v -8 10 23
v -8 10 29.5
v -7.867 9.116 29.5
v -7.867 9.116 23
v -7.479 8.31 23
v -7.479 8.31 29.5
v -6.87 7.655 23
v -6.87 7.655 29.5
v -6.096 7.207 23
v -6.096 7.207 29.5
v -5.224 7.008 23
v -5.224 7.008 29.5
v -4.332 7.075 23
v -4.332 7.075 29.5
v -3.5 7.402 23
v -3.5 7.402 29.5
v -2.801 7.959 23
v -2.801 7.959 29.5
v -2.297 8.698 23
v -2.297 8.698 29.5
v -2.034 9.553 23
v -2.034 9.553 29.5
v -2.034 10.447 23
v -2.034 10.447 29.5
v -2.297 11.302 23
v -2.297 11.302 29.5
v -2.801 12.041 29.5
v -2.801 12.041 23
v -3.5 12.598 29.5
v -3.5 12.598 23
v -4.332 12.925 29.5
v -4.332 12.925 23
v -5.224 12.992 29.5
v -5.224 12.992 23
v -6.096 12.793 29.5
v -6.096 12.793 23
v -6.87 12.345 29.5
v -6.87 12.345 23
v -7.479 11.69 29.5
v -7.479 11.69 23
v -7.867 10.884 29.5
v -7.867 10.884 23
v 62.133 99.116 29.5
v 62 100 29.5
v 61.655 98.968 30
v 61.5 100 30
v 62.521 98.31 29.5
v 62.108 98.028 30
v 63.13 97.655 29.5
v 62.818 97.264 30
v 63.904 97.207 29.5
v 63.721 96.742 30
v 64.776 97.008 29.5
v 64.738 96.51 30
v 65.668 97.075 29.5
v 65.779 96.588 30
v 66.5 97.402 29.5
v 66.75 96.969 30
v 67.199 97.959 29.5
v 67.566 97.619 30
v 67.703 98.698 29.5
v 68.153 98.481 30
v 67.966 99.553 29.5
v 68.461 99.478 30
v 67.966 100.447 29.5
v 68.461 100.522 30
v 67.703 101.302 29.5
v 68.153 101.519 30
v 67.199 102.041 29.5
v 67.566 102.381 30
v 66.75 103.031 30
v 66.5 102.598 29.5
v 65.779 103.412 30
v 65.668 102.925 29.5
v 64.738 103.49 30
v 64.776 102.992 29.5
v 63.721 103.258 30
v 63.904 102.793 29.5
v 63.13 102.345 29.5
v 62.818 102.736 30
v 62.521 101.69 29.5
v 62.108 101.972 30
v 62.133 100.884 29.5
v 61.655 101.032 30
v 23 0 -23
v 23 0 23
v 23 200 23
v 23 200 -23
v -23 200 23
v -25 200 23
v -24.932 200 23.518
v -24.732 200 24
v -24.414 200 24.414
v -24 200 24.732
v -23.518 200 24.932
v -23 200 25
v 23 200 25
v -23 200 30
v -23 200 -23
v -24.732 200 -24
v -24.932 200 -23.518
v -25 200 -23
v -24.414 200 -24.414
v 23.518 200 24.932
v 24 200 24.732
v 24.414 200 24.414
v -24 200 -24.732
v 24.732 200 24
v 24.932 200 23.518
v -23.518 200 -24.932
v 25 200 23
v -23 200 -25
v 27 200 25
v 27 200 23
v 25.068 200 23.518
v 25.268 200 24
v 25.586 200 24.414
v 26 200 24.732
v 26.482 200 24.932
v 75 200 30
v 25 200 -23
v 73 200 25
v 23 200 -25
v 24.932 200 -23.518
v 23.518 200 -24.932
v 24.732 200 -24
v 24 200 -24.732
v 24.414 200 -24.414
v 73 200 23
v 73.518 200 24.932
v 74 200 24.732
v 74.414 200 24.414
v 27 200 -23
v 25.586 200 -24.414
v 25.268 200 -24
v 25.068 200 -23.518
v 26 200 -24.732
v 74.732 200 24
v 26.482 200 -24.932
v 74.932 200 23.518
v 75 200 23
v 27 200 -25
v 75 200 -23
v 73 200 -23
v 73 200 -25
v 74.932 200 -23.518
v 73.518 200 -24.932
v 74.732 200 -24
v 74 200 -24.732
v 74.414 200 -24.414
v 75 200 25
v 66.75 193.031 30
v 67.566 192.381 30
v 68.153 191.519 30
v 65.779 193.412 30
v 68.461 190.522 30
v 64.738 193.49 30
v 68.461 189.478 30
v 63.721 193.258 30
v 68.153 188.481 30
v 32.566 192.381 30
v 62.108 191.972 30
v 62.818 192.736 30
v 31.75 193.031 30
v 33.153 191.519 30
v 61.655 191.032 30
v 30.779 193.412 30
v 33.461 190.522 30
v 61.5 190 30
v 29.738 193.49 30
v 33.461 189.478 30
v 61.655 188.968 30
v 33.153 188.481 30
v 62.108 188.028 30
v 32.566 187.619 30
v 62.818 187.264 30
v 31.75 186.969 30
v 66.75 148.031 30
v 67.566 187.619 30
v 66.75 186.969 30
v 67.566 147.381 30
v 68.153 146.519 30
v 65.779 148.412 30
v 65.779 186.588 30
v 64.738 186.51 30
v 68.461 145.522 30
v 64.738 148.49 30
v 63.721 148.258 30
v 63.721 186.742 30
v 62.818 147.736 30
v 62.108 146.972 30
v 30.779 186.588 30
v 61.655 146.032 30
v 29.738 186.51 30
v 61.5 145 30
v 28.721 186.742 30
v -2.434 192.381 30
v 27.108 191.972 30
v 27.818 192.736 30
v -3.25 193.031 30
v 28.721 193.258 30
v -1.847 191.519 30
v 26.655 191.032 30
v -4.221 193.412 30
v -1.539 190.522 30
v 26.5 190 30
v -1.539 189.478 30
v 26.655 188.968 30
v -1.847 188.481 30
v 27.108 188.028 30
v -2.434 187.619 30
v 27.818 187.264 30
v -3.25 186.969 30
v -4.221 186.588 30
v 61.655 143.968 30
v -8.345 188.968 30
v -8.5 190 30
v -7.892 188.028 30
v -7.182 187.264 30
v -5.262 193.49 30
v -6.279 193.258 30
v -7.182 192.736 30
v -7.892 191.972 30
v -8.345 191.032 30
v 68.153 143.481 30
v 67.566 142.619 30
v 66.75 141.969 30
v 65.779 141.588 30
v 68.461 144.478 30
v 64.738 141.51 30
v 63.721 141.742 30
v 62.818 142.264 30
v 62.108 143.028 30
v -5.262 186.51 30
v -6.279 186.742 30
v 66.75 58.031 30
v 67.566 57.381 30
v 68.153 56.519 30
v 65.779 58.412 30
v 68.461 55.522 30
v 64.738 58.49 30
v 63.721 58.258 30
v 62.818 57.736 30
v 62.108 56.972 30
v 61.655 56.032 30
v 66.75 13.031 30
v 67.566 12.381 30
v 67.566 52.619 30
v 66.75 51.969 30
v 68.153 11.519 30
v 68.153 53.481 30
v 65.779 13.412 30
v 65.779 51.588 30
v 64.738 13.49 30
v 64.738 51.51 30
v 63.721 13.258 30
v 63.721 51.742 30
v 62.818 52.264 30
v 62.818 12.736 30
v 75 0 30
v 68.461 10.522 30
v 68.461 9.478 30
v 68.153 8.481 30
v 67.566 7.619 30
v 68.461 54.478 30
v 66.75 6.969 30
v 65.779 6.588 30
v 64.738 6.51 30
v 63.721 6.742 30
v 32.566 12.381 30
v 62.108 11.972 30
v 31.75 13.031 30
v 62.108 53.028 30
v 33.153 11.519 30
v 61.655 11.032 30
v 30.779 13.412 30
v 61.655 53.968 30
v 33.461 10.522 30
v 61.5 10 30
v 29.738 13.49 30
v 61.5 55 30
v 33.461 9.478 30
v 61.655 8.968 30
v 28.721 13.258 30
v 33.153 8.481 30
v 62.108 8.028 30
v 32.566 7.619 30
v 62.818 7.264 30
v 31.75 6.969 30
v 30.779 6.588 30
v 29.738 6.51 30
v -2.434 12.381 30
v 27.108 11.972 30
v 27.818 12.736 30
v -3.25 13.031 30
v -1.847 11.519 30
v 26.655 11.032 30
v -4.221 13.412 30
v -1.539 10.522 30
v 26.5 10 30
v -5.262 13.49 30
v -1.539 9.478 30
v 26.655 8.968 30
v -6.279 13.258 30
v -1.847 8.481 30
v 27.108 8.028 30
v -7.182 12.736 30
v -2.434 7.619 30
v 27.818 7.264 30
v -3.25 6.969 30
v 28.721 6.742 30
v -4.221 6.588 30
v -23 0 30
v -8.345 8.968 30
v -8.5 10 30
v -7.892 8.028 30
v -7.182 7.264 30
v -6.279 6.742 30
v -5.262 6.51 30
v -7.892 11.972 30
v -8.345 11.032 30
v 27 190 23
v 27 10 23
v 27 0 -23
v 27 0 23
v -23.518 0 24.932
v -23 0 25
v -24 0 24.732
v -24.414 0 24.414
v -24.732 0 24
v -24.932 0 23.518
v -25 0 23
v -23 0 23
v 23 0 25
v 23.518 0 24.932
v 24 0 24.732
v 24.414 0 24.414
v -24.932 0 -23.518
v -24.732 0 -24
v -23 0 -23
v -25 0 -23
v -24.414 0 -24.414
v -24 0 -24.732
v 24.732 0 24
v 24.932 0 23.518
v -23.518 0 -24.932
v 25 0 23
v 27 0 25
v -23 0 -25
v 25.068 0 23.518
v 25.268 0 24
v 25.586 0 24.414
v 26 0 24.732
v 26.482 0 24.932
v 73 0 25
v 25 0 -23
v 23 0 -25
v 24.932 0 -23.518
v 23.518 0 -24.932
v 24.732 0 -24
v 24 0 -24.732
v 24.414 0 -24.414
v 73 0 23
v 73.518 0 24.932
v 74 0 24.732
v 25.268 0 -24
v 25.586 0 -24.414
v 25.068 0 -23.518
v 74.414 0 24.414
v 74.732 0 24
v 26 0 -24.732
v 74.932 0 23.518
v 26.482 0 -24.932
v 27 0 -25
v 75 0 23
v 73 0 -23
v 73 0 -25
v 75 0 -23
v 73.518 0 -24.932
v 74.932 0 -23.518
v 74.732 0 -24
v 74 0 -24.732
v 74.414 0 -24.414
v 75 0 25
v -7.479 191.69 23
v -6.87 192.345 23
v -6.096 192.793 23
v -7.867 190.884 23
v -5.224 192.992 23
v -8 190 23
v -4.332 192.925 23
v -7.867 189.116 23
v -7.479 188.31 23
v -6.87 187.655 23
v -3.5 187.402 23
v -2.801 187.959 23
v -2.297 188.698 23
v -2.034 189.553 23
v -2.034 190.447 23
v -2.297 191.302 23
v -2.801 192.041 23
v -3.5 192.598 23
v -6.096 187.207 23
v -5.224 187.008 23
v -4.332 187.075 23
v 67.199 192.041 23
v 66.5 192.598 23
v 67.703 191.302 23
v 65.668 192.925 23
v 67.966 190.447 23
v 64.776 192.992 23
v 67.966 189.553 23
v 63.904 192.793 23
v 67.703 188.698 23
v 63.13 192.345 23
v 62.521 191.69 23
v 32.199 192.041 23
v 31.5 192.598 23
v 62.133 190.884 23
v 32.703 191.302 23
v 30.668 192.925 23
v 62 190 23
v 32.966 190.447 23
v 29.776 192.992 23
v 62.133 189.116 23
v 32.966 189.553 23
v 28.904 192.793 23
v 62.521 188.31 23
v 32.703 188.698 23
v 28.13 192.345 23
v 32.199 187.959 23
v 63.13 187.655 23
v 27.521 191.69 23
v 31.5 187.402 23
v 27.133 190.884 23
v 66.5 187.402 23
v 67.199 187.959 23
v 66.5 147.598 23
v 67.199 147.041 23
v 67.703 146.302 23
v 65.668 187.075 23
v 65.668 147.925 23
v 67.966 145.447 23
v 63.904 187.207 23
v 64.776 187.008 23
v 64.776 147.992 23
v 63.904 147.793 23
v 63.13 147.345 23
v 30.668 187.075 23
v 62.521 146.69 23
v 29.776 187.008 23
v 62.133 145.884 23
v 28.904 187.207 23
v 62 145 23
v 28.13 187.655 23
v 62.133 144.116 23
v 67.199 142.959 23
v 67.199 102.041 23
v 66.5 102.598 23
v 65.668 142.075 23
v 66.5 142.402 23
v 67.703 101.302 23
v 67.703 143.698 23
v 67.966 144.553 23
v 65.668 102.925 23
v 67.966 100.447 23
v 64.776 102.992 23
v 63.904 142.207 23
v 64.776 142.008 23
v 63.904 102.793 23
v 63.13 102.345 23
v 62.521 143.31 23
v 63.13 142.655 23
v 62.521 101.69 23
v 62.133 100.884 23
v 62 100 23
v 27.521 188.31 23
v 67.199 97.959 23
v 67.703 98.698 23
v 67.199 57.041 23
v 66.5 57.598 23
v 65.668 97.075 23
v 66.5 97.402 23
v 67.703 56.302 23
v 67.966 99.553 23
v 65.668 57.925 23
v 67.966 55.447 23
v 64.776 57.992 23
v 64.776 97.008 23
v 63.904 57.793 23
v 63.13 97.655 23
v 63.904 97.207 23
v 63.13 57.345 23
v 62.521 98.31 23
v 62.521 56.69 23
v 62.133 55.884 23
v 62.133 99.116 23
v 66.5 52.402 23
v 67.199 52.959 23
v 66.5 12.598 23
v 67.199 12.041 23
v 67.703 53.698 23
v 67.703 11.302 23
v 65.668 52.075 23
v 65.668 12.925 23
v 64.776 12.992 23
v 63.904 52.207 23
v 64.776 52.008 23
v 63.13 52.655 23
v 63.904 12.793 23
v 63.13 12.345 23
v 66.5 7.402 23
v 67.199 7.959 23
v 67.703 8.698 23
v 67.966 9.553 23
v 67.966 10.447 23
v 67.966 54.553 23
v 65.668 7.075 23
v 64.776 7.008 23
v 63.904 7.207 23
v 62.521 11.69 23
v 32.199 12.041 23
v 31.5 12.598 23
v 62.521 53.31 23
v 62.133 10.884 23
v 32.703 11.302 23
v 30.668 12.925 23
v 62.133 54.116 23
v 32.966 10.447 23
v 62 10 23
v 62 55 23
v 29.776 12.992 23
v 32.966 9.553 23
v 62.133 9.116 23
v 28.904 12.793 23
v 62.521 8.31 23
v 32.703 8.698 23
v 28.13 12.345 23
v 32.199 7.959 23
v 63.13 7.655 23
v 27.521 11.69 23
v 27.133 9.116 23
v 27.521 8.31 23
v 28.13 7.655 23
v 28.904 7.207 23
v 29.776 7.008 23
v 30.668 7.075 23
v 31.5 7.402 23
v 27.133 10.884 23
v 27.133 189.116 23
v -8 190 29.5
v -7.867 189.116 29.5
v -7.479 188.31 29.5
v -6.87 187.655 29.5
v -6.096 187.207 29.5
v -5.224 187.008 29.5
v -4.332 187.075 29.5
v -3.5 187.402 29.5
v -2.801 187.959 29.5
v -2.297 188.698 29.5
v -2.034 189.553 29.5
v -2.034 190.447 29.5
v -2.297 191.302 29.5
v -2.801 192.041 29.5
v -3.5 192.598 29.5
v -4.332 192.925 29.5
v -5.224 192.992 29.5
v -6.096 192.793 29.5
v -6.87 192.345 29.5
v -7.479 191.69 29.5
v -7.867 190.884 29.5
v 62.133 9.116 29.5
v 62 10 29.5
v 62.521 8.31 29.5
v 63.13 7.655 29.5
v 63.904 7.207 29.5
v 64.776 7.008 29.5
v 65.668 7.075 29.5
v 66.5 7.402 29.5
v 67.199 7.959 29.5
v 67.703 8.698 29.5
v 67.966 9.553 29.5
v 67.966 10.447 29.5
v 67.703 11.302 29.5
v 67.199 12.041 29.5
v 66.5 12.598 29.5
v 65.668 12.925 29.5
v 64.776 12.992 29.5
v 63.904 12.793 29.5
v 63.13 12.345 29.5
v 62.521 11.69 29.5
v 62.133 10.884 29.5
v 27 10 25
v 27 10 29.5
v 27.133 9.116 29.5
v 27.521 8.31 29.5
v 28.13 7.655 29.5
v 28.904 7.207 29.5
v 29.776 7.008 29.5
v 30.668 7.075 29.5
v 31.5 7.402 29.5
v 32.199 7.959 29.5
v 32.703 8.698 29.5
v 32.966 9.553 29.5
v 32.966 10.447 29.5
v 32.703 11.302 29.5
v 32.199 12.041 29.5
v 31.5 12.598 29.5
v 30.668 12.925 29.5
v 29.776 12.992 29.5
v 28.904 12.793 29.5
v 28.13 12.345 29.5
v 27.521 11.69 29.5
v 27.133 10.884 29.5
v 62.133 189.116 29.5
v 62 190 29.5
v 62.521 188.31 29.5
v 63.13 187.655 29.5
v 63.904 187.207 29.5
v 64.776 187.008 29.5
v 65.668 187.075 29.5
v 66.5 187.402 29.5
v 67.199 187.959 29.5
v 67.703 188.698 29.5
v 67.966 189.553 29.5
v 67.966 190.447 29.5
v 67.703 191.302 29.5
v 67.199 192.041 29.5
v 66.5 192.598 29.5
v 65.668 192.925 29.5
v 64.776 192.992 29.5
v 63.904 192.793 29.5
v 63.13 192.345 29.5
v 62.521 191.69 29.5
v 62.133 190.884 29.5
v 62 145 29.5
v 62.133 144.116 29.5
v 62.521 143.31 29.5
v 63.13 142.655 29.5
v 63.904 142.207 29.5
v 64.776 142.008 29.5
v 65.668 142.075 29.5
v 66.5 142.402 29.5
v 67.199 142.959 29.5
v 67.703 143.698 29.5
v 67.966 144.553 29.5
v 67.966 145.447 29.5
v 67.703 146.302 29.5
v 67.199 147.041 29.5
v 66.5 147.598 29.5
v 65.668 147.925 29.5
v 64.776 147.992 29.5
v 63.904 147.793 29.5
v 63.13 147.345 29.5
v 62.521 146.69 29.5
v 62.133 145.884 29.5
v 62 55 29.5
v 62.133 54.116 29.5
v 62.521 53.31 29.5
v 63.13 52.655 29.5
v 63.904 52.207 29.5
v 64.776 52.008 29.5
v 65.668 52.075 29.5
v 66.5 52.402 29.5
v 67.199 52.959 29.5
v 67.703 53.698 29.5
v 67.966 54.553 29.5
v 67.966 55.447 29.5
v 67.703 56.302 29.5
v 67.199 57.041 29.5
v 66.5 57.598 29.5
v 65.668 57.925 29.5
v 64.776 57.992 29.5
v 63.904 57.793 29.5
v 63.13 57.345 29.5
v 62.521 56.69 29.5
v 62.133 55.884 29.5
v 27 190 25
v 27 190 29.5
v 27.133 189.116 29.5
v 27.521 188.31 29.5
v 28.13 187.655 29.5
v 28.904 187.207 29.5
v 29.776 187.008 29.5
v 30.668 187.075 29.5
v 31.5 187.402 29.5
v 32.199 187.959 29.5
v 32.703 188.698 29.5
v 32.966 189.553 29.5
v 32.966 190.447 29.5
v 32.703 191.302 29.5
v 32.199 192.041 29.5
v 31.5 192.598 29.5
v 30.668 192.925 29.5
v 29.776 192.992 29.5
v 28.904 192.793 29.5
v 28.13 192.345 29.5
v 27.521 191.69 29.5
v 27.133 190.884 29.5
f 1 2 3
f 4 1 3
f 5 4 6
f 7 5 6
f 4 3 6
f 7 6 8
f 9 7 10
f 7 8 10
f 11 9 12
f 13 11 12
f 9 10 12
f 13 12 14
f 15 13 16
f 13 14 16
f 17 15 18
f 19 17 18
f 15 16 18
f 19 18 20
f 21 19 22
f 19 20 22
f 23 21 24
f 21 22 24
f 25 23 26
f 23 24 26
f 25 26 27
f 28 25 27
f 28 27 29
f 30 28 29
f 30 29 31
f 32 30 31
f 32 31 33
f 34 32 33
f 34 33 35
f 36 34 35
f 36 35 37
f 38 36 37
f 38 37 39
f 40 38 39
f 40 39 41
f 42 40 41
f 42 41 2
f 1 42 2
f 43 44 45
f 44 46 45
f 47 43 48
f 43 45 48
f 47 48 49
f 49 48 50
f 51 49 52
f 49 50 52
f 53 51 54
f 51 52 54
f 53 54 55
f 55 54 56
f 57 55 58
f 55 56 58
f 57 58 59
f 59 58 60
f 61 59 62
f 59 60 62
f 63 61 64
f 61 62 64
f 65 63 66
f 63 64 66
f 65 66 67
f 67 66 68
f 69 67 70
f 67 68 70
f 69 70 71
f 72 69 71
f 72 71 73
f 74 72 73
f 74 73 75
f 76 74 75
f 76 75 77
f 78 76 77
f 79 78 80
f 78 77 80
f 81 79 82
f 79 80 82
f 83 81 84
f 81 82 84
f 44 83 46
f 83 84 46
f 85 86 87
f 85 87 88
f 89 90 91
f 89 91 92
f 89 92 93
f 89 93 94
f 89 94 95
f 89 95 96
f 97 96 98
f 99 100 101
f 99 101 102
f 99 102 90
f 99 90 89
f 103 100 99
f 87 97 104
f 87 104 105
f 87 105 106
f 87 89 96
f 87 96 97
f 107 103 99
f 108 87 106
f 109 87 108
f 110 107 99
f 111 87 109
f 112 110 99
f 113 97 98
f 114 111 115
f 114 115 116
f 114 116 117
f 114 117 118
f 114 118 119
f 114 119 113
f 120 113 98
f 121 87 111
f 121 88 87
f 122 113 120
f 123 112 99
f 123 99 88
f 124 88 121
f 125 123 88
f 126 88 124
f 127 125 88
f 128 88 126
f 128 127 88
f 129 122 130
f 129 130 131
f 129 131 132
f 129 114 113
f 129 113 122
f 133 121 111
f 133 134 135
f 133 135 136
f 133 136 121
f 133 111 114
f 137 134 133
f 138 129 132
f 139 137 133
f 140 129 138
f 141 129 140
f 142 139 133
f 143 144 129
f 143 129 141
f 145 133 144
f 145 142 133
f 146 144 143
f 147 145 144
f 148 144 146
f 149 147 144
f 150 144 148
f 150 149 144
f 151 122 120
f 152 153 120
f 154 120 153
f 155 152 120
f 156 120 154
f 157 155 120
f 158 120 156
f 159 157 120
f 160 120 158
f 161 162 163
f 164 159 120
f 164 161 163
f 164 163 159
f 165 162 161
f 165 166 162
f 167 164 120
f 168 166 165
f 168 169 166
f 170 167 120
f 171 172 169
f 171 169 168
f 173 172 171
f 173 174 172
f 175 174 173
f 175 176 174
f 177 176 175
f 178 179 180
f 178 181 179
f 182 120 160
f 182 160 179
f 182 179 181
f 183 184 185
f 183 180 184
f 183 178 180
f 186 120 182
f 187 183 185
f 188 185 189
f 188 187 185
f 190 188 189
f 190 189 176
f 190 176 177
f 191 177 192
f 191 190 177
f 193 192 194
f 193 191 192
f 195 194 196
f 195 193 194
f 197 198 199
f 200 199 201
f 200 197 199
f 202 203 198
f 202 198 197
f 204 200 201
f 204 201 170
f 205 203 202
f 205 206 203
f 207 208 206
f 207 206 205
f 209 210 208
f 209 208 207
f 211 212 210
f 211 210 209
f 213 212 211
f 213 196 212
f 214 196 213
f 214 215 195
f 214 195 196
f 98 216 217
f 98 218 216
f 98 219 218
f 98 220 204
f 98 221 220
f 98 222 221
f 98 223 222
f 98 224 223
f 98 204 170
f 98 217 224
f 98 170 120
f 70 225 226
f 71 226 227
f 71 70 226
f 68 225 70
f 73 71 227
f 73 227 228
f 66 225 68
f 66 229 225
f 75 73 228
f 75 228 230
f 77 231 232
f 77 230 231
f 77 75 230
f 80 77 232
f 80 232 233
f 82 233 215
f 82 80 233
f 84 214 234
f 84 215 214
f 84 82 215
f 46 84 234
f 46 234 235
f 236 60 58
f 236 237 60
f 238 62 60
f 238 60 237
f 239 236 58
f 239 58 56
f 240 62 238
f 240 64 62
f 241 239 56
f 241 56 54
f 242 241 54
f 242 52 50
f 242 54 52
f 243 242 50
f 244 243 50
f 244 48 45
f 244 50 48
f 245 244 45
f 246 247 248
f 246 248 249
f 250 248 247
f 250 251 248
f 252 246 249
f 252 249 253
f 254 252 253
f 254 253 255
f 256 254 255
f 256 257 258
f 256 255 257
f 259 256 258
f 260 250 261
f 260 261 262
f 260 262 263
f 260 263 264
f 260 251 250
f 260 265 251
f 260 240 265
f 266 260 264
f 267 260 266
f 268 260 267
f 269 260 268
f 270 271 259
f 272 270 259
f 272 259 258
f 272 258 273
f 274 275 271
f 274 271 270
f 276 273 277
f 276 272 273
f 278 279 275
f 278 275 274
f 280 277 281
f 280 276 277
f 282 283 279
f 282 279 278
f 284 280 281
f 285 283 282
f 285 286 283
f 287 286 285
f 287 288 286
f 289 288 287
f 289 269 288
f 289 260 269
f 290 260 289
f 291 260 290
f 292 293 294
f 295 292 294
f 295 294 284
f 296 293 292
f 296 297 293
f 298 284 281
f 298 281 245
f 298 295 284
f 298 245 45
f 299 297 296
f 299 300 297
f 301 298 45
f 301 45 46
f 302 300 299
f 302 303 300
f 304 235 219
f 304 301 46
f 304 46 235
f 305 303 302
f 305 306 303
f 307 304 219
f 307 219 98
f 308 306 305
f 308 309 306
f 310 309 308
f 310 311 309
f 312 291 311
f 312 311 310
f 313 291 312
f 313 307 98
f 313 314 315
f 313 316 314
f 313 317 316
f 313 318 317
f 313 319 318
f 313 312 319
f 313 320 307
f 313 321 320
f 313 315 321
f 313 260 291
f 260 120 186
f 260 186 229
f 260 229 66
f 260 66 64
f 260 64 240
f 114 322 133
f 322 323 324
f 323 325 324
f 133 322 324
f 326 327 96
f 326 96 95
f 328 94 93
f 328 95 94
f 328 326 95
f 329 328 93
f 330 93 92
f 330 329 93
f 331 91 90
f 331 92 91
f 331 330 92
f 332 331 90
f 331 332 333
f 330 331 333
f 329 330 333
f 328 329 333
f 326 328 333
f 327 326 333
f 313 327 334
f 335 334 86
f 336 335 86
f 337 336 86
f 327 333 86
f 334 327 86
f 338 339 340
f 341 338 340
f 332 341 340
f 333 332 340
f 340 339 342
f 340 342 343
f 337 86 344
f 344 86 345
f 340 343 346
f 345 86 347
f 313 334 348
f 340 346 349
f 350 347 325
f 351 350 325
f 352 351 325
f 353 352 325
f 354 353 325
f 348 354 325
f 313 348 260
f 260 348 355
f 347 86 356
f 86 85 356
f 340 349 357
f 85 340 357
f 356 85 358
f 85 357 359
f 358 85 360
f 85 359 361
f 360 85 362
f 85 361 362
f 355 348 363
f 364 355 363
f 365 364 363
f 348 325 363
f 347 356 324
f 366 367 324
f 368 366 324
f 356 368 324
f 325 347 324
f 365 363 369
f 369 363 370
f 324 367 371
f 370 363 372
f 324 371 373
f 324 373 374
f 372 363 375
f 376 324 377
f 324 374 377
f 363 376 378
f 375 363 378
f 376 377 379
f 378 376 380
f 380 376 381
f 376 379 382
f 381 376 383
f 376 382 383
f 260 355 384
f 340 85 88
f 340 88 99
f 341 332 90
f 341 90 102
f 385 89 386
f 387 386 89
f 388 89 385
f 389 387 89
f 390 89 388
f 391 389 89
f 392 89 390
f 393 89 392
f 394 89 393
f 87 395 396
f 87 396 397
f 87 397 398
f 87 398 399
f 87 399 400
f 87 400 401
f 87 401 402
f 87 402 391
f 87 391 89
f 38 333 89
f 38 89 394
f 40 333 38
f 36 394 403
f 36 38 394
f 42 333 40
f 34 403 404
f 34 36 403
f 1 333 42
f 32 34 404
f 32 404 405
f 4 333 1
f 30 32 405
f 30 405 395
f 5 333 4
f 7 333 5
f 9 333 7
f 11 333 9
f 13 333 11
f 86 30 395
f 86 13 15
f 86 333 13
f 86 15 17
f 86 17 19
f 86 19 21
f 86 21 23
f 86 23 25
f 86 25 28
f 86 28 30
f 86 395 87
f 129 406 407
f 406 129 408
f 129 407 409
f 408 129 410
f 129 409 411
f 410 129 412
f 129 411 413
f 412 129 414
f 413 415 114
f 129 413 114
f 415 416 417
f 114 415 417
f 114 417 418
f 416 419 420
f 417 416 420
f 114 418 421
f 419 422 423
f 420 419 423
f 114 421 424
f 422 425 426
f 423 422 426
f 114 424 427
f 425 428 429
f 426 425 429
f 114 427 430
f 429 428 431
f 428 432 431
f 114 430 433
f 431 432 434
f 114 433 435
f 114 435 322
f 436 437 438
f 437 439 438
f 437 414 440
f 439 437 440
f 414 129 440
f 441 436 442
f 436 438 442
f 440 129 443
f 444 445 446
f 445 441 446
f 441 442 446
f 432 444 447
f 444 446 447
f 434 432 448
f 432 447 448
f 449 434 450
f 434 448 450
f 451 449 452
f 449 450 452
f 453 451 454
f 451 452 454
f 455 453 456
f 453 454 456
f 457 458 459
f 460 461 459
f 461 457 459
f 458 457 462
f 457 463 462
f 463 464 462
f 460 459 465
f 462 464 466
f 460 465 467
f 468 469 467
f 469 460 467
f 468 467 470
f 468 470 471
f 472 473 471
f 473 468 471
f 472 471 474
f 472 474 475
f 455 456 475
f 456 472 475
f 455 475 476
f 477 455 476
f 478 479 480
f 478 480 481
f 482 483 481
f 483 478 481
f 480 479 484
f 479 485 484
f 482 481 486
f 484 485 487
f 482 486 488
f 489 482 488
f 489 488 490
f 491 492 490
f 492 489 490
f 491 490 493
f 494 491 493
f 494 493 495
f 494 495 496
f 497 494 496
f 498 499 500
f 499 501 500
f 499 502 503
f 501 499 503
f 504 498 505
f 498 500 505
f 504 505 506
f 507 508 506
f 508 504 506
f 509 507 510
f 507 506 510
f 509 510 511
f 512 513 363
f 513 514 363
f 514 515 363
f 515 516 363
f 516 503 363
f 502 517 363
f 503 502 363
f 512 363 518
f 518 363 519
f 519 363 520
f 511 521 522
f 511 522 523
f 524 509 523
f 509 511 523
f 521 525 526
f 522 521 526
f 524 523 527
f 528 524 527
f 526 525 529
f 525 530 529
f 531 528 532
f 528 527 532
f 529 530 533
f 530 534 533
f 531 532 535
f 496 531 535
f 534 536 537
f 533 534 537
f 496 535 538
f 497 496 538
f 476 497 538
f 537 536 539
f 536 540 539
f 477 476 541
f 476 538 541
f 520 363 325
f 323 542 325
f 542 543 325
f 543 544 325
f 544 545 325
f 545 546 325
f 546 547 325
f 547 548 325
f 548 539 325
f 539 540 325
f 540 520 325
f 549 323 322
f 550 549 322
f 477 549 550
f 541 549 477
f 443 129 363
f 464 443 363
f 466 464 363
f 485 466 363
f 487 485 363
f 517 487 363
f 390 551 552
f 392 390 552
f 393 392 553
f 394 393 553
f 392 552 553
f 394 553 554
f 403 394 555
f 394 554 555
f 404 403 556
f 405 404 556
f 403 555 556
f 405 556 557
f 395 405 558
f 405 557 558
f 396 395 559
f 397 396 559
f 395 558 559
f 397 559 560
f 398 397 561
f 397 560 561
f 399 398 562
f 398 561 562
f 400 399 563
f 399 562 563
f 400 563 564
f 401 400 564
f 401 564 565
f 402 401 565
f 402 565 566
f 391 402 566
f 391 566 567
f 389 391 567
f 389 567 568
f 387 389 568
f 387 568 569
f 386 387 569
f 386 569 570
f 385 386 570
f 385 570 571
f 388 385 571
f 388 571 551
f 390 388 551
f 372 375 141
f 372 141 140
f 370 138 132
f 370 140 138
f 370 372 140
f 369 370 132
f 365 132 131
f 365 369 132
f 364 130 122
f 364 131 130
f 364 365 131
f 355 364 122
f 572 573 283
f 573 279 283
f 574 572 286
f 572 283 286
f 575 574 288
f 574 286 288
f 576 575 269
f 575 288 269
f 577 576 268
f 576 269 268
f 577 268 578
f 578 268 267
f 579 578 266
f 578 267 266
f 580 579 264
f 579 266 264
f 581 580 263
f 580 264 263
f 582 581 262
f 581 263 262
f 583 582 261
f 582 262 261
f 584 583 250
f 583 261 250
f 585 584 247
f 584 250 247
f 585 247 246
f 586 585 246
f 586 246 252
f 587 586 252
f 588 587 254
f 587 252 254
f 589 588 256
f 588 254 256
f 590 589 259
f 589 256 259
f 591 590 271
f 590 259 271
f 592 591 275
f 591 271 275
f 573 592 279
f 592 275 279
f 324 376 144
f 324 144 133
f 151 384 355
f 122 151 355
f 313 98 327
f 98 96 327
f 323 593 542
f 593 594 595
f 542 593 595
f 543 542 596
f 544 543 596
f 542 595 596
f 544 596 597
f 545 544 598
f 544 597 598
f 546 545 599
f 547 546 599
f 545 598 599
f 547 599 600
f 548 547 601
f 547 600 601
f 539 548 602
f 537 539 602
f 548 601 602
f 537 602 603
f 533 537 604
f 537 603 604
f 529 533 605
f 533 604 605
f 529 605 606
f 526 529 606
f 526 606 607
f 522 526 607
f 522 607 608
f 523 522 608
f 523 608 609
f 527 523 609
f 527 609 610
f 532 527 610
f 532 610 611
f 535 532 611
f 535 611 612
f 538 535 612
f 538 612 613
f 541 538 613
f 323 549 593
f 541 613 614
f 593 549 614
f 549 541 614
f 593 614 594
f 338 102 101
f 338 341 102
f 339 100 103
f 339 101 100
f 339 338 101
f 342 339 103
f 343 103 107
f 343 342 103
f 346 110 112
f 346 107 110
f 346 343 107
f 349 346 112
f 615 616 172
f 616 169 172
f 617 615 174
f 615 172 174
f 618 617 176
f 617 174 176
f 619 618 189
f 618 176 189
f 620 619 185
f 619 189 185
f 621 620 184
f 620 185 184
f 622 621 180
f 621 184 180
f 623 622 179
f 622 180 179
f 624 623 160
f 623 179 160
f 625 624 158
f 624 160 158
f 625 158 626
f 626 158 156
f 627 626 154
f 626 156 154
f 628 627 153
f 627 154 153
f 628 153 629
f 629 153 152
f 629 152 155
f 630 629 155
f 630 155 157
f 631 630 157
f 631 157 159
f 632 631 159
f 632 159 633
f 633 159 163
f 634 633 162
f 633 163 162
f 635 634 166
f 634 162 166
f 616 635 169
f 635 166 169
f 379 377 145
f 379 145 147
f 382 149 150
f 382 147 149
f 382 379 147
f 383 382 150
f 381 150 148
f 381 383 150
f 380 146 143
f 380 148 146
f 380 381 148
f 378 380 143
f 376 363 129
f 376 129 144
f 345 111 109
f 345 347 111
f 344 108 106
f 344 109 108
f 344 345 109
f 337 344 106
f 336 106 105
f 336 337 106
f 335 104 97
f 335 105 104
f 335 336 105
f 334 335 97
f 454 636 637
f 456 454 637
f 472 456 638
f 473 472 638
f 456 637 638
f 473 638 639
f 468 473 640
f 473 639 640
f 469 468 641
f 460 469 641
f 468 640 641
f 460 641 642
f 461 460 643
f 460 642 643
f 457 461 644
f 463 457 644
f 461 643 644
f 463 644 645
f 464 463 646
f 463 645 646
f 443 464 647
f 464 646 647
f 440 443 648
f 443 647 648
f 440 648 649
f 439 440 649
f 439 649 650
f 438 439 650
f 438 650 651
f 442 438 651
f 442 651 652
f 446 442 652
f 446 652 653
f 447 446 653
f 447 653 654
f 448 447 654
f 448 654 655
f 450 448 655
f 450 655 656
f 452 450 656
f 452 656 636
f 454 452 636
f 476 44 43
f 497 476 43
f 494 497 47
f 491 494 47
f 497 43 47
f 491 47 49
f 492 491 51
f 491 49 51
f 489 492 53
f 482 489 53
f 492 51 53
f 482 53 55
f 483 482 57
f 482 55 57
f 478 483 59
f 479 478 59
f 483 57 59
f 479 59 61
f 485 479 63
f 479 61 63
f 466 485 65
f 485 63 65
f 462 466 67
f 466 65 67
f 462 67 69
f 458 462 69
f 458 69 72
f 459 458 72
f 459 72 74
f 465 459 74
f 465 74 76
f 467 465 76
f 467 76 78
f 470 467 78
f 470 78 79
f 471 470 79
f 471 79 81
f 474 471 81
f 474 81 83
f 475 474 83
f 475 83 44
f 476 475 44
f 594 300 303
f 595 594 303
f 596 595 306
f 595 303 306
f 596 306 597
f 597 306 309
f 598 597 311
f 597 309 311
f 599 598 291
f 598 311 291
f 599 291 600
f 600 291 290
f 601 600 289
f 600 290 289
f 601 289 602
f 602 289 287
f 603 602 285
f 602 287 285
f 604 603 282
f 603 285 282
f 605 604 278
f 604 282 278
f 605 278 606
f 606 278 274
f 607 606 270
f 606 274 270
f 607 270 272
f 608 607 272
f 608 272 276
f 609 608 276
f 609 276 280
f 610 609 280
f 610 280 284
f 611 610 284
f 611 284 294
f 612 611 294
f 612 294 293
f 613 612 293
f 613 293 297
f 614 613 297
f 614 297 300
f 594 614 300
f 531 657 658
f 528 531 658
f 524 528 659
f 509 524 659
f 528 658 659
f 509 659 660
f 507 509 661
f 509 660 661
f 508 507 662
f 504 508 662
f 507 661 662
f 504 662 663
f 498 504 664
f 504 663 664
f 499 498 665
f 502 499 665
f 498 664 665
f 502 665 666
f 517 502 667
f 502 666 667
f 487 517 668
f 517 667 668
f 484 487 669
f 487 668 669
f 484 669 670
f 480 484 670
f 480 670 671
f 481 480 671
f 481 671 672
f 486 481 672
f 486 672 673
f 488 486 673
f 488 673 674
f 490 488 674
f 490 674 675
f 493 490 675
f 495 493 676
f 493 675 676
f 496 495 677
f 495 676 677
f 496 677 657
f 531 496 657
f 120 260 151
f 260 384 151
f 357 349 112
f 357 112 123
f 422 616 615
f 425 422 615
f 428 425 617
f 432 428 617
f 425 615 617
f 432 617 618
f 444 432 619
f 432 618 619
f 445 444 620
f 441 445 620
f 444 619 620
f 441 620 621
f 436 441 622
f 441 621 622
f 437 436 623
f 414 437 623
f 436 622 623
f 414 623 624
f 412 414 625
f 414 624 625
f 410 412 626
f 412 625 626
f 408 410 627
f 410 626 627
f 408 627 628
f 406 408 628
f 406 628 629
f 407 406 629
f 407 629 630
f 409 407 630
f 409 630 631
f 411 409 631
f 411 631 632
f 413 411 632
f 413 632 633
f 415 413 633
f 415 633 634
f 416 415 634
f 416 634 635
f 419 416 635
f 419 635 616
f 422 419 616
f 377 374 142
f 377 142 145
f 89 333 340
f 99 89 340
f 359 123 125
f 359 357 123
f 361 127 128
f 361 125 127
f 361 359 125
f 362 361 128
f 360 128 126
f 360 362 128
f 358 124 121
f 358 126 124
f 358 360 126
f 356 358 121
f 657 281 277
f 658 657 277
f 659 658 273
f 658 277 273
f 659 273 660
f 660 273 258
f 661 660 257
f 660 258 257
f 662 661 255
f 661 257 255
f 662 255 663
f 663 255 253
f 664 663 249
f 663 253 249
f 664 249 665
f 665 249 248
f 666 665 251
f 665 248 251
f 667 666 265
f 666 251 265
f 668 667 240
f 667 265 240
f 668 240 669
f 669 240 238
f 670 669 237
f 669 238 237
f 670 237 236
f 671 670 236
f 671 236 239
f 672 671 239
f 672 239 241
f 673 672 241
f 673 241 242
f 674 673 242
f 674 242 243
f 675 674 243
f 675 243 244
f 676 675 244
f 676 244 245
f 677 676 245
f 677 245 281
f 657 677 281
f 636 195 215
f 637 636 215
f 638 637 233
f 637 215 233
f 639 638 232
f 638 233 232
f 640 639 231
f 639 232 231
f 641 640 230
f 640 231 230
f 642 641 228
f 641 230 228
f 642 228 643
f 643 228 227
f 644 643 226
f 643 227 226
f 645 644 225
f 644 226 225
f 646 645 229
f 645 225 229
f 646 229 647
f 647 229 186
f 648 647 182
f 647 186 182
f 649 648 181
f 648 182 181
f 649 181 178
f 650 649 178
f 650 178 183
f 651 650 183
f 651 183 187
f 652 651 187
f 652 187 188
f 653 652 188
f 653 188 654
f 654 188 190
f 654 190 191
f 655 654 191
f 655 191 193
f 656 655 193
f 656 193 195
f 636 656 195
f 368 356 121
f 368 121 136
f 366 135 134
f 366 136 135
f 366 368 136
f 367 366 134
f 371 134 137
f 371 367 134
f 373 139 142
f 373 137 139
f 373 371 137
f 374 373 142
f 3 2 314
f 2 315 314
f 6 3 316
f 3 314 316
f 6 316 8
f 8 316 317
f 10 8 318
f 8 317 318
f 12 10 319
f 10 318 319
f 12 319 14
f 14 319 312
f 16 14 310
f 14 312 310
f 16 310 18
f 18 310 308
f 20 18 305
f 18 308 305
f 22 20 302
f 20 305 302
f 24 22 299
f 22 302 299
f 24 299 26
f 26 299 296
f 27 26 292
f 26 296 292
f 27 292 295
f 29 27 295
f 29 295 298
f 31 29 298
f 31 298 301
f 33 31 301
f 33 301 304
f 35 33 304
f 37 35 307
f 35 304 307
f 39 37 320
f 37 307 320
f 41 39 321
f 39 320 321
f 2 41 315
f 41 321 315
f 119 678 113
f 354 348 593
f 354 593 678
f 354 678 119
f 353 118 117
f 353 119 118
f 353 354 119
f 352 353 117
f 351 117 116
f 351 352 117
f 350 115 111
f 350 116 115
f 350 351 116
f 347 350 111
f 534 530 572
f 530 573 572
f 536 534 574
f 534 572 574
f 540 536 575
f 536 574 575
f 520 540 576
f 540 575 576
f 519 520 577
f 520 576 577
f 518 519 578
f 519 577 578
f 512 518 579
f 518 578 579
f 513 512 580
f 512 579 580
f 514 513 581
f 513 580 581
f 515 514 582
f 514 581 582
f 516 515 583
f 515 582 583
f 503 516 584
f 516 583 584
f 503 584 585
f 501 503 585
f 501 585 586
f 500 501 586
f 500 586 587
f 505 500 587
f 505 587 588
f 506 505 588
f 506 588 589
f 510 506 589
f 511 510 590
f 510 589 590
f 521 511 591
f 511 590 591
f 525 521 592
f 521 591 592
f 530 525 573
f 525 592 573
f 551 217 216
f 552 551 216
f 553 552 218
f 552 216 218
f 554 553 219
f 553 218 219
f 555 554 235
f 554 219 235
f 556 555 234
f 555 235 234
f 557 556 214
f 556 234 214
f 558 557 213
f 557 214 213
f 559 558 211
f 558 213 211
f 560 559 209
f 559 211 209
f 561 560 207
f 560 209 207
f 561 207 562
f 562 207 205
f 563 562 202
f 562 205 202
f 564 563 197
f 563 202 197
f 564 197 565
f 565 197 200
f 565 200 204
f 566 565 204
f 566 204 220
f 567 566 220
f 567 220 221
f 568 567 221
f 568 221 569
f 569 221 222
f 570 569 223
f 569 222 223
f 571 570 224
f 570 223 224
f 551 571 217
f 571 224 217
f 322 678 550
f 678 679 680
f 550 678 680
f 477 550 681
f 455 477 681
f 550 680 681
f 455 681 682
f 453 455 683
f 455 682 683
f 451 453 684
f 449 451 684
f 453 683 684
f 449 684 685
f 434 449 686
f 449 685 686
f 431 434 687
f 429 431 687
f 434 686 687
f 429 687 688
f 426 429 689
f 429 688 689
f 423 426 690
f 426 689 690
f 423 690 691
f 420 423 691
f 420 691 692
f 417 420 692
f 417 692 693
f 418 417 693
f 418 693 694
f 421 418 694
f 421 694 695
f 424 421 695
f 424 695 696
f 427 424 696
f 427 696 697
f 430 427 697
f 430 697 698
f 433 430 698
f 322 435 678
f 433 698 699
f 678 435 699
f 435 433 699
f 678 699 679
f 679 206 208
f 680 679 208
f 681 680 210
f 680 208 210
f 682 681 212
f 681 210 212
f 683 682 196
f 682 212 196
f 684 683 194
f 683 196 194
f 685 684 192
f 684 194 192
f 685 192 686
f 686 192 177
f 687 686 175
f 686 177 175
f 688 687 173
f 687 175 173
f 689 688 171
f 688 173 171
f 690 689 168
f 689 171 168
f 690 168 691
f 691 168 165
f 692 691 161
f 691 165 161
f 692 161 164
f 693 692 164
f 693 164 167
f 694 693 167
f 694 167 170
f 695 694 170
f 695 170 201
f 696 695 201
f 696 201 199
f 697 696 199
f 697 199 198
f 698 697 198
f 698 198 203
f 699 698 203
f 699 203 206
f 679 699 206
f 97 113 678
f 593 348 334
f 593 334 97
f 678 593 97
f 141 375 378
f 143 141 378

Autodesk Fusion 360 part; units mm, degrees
sketch "Sketch1" plane through (0, 0, 0) normal (0, 1, 0) x (1, 0, 0)
  line L0 (0, -25) -> (23, -25)
  line L1 (25, -23) -> (25, 23)
  line L2 (23, 25) -> (0, 25)
  line L3 (0, -25) -> (-23, -25)
  line L4 (-25, -23) -> (-25, 23)
  line L5 (-23, 25) -> (0, 25)
  line L6 (0, -23) -> (-23, -23)
  line L7 (-23, -23) -> (-23, 23)
  line L8 (-23, 23) -> (0, 23)
  line L9 (23, 23) -> (0, 23)
  line L10 (23, -23) -> (23, 23)
  line L11 (0, -23) -> (23, -23)
  arc A0 (23, -25) -> (25, -23) centre (23, -23) ccw
  arc A1 (-25, -23) -> (-23, -25) centre (-23, -23) ccw
  arc A2 (-23, 25) -> (-25, 23) centre (-23, 23) ccw
  arc A3 (25, 23) -> (23, 25) centre (23, 23) ccw
  line L12 (73, 23) -> (50, 23)
  line L13 (73, 25) -> (50, 25)
  line L14 (50, -23) -> (73, -23)
  line L15 (50, -23) -> (27, -23)
  line L16 (50, -25) -> (73, -25)
  arc A4 (25, -23) -> (27, -25) centre (27, -23) ccw
  line L17 (27, 25) -> (50, 25)
  arc A5 (75, 23) -> (73, 25) centre (73, 23) ccw
  line L18 (73, -23) -> (73, 23)
  line L19 (25, -23) -> (25, 23)
  line L20 (27, -23) -> (27, 23)
  arc A6 (73, -25) -> (75, -23) centre (73, -23) ccw
  arc A7 (27, 25) -> (25, 23) centre (27, 23) ccw
  line L21 (50, -25) -> (27, -25)
  line L22 (75, -23) -> (75, 23)
  line L23 (27, 23) -> (50, 23)
  point P0 (25, -25)
  point P1 (25, 25)
  point P2 (75, -25)
  point P3 (75, 25)
  point P4 (50, 0)
  dimension "d1" = 25
  dimension "d2" = 25
  dimension "d3" = 50
  dimension "d4" = 2
  dimension "d7" = 2
  dimension "d8" = 2
  dimension "d9" = 2
  dimension "d10" = 2
  dimension "d11" = 2
  dimension "d12" = 25
  dimension "d13" = 25
  dimension "d14" = 50
  dimension "d15" = 2
  dimension "d16" = 2
  dimension "d17" = 2
  dimension "d18" = 2
extrude "Extrude2" add sketch "Sketch1" along normal blind 200
sketch "Sketch2" plane through (0, 0, 25) normal (0, 0, 1) x (-1, 0, 0)
  line L0 (23, 0) -> (-23, 0)
  line L1 (-23, 0) -> (-23, -200)
  line L2 (-23, -200) -> (23, -200)
  line L3 (23, -200) -> (23, 0)
  line L4 (25, 0) -> (-75, 0)
  line L5 (-75, 0) -> (-75, -200)
  line L6 (-75, -200) -> (25, -200)
  line L7 (25, -200) -> (25, 0)
  dimension "d21" = 100
  dimension "d22" = 200
extrude "Extrude3" add sketch "Sketch2" along normal blind 5 contours L0 L1 L2 L3 L4 L6 | L1 L4 L5 L6
sketch "Sketch3" plane through (0, 0, 30) normal (0, 0, 1) x (-1, 0, 0)
  line L0 (-75, -200) -> (23, -200)
  line L1 (23, -200) -> (23, 0)
  line L2 (23, 0) -> (-75, 0)
  line L3 (-75, 0) -> (-75, -200)
  line L4 (-75, 0) -> (-65, 0)
  line L5 (-65, 0) -> (-65, -10)
  line L6 (-65, -10) -> (-75, -10)
  line L7 (-75, -10) -> (-75, 0)
  circle A0 centre (-65, -10) radius 3
  circle A1 centre (-30, -10) radius 3
  circle A2 centre (5, -10) radius 3
  circle A3 centre (-65, -55) radius 3
  circle A4 centre (-65, -100) radius 3
  circle A5 centre (-65, -145) radius 3
  circle A6 centre (-65, -190) radius 3
  circle A7 centre (-30, -190) radius 3
  circle A8 centre (5, -190) radius 3
  dimension "d25" = 10
  dimension "d26" = 10
  dimension "d27" = 6
  dimension "d30" = 70
  dimension "d31" = -180
extrude "Extrude4" cut sketch "Sketch3" against normal blind 7 contours L5 L6 A0 | L5 L6 A0 | A1 | A2 | A3 | A4 | A5 | A6 | A7 | A8
chamfer "Chamfer1" distance 0.5 angle 45 1 edges at (-2.203, 188.9152, 30)
chamfer "Chamfer2" distance 0.5 angle 45 1 edges at (32.797, 188.9152, 30)
chamfer "Chamfer3" distance 0.5 angle 45 1 edges at (67.797, 188.9152, 30)
chamfer "Chamfer4" distance 0.5 angle 45 1 edges at (67.797, 143.9152, 30)
chamfer "Chamfer5" distance 0.5 angle 45 1 edges at (67.797, 98.9152, 30)
chamfer "Chamfer6" distance 0.5 angle 45 1 edges at (67.797, 53.9152, 30)
chamfer "Chamfer7" distance 0.5 angle 45 1 edges at (67.797, 8.9152, 30)
chamfer "Chamfer8" distance 0.5 angle 45 1 edges at (32.797, 8.9152, 30)
chamfer "Chamfer9" distance 0.5 angle 45 1 edges at (-2.203, 8.9152, 30)
